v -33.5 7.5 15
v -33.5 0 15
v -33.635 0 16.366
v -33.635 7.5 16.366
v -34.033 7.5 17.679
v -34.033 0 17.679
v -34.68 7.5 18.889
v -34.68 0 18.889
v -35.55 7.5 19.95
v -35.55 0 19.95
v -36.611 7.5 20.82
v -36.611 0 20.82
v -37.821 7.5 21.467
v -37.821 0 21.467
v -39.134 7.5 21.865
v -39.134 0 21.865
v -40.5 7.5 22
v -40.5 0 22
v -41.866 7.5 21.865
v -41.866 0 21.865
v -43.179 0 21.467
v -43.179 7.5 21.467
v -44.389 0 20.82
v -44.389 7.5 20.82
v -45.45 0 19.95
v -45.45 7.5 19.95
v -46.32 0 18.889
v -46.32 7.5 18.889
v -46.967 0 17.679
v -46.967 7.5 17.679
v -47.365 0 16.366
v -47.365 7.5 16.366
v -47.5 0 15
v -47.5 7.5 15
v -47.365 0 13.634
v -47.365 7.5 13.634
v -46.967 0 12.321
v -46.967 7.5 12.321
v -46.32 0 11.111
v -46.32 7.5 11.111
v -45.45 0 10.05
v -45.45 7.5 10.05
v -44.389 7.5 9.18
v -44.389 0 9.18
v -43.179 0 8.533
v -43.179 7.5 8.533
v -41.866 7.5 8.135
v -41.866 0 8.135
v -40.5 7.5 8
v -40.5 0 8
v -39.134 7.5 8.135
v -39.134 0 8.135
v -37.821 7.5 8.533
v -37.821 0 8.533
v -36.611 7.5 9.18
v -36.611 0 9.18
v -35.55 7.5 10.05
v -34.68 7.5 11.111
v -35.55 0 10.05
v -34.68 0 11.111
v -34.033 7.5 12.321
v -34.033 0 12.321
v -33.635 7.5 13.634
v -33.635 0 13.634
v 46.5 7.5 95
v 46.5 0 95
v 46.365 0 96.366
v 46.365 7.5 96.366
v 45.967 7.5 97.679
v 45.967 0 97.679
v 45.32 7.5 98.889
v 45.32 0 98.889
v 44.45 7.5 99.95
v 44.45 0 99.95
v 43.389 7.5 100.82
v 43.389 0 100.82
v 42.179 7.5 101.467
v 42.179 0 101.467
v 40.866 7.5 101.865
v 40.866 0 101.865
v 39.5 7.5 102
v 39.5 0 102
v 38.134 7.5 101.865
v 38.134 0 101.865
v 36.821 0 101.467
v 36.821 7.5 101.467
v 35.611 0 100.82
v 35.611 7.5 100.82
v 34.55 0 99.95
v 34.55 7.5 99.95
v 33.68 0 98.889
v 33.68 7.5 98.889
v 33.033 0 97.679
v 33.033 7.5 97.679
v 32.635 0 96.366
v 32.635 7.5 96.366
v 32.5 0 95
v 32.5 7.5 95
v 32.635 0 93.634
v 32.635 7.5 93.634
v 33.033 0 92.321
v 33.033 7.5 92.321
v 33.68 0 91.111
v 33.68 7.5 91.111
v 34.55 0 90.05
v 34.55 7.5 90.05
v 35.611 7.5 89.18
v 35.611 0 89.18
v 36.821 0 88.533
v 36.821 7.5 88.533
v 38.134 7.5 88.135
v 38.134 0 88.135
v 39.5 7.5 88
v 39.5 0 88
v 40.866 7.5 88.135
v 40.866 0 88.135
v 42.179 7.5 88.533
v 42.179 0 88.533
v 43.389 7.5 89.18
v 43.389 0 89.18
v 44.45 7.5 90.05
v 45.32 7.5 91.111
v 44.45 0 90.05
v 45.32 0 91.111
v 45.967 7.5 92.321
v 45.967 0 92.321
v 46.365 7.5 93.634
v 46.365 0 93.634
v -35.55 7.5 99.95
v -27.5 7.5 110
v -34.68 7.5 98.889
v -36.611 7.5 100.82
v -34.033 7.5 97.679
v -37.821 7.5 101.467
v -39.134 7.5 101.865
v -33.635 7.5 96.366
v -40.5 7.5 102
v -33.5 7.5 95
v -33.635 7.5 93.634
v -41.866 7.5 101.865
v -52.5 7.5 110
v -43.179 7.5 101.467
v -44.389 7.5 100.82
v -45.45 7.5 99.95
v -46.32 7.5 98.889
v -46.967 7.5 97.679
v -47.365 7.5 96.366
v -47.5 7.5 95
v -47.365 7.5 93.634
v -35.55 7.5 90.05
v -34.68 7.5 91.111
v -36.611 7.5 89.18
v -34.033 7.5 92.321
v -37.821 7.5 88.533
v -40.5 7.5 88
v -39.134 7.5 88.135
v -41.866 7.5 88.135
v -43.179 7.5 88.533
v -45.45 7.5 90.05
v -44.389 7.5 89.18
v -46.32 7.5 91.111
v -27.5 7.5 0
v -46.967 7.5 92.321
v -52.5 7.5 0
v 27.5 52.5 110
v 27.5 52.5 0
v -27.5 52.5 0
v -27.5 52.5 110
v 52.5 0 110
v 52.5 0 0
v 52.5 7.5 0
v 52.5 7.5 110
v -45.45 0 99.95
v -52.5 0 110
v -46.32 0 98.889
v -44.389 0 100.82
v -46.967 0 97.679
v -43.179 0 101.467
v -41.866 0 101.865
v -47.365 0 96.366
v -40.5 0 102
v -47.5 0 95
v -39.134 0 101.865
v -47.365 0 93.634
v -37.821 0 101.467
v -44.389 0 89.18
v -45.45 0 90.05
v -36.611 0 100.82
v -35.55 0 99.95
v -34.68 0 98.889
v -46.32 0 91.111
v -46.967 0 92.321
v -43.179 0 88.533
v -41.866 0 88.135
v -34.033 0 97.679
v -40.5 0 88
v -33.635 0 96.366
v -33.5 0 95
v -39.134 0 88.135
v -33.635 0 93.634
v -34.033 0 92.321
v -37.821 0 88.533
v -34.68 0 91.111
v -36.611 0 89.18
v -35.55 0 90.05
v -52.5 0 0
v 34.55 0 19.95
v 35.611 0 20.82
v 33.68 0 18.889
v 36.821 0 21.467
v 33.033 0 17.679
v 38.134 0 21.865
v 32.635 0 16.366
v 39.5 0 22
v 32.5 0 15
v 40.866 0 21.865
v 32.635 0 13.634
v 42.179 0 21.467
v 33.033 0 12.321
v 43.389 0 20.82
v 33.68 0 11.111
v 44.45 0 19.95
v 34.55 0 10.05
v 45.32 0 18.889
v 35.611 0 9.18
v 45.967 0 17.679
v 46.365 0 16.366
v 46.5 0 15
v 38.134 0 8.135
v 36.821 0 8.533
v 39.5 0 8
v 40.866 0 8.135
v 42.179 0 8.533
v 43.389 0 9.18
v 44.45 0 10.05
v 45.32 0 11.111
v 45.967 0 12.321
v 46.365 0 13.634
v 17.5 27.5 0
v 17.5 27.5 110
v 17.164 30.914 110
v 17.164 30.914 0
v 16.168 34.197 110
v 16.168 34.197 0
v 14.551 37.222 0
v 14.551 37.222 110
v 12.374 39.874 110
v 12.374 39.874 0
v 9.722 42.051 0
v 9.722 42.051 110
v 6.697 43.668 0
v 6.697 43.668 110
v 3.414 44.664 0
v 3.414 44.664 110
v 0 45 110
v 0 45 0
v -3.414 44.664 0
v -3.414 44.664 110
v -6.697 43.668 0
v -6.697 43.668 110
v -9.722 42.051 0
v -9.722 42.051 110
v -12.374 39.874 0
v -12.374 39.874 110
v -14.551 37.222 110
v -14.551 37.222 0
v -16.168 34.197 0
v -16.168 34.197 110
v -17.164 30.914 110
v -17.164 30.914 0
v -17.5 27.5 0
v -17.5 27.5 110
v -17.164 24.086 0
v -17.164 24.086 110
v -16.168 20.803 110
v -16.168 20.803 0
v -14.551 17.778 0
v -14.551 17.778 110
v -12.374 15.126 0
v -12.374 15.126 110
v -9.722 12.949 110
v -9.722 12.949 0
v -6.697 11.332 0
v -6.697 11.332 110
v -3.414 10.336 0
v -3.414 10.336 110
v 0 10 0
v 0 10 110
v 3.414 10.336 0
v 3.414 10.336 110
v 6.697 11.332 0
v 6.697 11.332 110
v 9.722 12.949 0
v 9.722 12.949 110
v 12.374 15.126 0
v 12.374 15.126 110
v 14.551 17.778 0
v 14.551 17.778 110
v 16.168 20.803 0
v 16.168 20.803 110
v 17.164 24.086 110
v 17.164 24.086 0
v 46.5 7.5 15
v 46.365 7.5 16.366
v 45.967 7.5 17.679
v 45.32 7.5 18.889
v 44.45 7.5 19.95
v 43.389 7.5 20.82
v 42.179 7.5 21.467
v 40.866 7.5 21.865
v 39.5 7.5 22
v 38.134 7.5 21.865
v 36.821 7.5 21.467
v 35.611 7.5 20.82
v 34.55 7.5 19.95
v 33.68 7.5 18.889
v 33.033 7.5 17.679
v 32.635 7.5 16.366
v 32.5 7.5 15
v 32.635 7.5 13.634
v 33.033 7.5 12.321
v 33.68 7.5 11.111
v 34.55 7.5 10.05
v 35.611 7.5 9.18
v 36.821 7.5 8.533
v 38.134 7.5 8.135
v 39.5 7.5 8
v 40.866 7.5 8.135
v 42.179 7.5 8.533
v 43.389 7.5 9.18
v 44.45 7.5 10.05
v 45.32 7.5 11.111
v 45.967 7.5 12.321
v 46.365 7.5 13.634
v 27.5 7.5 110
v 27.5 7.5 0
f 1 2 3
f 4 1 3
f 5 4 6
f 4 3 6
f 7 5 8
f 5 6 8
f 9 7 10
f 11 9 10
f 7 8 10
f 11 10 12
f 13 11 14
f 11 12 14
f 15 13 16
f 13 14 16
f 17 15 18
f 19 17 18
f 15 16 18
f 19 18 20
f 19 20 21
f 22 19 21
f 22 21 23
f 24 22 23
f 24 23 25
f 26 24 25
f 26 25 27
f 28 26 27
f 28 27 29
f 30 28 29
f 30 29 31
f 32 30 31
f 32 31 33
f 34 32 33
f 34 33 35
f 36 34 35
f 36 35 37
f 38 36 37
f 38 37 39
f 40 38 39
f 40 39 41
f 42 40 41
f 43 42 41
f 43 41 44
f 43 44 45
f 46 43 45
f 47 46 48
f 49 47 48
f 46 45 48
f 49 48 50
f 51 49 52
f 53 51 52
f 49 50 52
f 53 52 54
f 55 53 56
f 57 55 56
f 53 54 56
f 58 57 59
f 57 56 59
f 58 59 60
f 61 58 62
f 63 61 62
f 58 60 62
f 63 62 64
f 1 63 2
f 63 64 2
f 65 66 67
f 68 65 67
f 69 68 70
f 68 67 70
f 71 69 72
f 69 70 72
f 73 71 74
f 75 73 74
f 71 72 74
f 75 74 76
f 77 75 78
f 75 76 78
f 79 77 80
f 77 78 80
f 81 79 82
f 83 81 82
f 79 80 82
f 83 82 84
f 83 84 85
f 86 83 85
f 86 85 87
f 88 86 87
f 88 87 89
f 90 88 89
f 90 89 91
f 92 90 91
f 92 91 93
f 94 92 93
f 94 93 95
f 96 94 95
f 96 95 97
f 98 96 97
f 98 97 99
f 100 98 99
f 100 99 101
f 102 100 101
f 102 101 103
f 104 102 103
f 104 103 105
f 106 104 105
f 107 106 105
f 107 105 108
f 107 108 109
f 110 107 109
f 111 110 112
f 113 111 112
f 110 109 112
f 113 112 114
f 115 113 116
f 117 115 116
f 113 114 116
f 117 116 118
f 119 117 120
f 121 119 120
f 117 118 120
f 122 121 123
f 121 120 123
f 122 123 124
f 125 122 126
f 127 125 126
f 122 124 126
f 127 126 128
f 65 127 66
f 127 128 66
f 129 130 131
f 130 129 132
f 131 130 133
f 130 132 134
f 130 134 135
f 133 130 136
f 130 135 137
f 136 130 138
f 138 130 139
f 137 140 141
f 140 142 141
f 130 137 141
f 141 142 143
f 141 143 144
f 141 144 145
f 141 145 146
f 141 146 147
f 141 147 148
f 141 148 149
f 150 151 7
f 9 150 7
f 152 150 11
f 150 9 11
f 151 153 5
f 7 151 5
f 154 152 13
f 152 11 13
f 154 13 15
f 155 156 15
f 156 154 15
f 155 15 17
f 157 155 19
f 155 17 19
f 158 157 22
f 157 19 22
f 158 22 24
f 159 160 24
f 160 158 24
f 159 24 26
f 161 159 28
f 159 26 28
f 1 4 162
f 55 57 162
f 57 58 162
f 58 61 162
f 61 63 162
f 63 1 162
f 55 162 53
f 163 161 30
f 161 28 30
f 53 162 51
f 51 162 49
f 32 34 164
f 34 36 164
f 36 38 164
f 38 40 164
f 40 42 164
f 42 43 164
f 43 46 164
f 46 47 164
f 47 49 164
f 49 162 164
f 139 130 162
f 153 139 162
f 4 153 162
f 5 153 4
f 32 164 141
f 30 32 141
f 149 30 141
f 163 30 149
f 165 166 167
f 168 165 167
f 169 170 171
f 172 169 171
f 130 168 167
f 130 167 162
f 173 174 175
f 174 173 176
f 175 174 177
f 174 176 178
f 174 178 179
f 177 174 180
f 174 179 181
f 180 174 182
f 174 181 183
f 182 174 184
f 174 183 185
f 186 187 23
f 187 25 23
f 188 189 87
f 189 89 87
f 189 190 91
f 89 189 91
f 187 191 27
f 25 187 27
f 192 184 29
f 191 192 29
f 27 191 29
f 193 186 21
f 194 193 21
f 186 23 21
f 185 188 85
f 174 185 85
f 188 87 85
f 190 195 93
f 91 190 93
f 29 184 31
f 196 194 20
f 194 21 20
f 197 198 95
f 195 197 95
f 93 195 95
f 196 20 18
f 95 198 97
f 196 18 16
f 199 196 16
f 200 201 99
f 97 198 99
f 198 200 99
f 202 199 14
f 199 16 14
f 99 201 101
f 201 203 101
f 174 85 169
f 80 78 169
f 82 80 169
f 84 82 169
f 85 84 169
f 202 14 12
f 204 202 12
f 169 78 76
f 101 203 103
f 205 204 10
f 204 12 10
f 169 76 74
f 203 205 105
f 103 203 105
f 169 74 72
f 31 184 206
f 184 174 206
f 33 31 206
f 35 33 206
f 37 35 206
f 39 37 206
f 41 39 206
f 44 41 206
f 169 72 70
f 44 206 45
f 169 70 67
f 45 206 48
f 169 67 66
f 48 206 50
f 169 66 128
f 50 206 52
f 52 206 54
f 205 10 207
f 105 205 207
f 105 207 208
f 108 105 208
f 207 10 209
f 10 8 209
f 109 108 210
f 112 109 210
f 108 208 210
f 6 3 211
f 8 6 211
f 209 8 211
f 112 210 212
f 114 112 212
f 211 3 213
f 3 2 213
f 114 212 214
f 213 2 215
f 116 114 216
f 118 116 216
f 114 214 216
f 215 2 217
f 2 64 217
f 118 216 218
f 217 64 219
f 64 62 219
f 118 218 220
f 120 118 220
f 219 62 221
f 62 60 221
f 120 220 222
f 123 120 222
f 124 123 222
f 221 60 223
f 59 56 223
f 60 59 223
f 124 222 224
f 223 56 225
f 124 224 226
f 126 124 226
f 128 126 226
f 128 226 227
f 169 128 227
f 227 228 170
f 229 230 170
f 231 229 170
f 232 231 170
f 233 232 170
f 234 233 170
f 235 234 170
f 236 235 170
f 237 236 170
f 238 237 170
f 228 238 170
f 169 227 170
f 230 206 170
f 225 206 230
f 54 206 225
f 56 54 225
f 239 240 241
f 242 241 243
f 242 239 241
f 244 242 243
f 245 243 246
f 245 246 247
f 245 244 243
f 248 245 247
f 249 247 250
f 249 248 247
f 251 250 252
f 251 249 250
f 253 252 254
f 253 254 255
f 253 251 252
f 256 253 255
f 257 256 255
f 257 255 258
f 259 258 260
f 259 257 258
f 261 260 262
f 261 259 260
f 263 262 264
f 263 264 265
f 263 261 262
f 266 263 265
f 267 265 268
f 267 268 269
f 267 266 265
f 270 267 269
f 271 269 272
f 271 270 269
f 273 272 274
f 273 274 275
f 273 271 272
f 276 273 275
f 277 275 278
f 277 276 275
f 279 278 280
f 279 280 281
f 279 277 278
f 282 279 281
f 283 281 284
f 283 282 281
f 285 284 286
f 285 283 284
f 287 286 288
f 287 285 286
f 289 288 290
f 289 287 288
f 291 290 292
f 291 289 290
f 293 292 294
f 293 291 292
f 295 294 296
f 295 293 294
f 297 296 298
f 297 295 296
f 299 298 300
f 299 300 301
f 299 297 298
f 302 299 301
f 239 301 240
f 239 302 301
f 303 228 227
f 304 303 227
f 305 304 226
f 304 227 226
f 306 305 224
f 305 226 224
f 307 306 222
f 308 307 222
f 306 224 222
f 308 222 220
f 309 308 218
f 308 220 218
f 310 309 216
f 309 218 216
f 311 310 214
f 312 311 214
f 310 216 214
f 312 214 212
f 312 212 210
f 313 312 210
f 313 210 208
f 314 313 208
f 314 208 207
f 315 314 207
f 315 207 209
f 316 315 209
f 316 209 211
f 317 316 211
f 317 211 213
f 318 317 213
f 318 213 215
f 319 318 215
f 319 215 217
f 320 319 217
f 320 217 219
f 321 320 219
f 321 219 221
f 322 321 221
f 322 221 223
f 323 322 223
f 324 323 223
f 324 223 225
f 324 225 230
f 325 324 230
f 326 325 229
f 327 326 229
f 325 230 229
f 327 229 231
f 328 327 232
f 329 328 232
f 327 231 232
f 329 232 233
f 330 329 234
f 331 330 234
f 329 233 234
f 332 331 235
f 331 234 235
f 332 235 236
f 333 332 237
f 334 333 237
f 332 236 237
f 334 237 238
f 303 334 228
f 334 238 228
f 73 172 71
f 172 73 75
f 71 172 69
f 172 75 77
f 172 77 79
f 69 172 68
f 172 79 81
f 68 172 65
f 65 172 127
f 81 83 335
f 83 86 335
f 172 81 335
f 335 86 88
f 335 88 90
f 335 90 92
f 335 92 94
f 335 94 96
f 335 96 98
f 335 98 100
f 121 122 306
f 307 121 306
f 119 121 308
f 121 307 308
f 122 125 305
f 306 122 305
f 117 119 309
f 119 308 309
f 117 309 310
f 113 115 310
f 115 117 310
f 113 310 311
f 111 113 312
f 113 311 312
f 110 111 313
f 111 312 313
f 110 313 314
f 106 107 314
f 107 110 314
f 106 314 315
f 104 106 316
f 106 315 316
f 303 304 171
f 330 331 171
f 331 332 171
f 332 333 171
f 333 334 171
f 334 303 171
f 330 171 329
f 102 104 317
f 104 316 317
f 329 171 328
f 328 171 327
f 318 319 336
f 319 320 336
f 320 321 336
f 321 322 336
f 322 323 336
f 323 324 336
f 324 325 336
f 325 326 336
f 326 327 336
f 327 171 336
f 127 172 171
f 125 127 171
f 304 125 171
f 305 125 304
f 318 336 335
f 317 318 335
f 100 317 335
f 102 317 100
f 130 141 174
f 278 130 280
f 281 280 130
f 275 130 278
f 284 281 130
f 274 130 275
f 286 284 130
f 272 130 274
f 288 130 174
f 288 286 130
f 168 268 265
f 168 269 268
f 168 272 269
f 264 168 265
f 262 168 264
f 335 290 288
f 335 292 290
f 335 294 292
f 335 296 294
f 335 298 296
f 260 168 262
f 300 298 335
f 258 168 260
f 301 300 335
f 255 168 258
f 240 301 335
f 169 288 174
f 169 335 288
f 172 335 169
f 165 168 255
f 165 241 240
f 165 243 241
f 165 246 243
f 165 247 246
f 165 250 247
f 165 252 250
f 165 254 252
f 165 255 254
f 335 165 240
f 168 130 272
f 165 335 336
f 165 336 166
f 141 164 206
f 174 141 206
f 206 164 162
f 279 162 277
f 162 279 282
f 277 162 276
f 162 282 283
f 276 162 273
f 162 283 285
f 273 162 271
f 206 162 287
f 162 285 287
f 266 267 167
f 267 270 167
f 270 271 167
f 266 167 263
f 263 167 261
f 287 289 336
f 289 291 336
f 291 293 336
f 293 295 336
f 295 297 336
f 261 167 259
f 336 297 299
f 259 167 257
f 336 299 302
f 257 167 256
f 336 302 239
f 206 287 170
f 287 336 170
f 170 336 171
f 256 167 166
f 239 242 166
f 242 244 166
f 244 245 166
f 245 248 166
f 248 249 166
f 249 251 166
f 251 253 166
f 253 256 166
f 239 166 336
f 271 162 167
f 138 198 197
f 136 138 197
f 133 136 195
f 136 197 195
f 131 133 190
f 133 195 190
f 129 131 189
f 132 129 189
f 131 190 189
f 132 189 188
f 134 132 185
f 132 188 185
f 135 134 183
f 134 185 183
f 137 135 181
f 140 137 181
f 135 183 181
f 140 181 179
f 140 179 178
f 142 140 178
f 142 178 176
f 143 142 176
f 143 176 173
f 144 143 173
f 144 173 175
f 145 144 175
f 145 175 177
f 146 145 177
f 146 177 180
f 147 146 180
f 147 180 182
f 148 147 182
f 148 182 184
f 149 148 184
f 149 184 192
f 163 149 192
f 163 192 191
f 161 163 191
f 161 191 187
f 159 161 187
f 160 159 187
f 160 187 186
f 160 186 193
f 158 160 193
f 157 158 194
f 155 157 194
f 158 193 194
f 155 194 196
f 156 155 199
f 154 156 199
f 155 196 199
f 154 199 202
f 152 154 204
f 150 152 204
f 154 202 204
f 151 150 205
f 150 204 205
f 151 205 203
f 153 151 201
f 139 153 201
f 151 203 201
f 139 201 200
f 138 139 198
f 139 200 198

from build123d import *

# Parameters (mm, degrees)
F0_R     = 17.5
F1_DEPTH = 110
F2_R     = 7
F3_DEPTH = 25


with BuildPart() as f1:
    # F0 (on Top) → F1 (new body)
    with BuildSketch(Plane.XY):
        Polygon((-52.5, 7.5), (-52.5, 0), (0, 0), (52.5, 0), (52.5, 7.5), (27.5, 7.5), (27.5, 52.5), (0, 52.5), (-27.5, 52.5), (-27.5, 7.5), align=None)
        with Locations((0, 27.5)):
            Circle(F0_R, mode=Mode.SUBTRACT)
    extrude(amount=F1_DEPTH)

    # F2 (on face) → F3 (cut)
    with BuildSketch(Plane.XZ):
        with Locations((-40.5, 95)):
            Circle(F2_R)
        with Locations((39.5, 95)):
            Circle(F2_R)
        with Locations((-40.5, 15)):
            Circle(F2_R)
        with Locations((39.5, 15)):
            Circle(F2_R)
    extrude(amount=-F3_DEPTH, mode=Mode.SUBTRACT)


solid = f1.part
